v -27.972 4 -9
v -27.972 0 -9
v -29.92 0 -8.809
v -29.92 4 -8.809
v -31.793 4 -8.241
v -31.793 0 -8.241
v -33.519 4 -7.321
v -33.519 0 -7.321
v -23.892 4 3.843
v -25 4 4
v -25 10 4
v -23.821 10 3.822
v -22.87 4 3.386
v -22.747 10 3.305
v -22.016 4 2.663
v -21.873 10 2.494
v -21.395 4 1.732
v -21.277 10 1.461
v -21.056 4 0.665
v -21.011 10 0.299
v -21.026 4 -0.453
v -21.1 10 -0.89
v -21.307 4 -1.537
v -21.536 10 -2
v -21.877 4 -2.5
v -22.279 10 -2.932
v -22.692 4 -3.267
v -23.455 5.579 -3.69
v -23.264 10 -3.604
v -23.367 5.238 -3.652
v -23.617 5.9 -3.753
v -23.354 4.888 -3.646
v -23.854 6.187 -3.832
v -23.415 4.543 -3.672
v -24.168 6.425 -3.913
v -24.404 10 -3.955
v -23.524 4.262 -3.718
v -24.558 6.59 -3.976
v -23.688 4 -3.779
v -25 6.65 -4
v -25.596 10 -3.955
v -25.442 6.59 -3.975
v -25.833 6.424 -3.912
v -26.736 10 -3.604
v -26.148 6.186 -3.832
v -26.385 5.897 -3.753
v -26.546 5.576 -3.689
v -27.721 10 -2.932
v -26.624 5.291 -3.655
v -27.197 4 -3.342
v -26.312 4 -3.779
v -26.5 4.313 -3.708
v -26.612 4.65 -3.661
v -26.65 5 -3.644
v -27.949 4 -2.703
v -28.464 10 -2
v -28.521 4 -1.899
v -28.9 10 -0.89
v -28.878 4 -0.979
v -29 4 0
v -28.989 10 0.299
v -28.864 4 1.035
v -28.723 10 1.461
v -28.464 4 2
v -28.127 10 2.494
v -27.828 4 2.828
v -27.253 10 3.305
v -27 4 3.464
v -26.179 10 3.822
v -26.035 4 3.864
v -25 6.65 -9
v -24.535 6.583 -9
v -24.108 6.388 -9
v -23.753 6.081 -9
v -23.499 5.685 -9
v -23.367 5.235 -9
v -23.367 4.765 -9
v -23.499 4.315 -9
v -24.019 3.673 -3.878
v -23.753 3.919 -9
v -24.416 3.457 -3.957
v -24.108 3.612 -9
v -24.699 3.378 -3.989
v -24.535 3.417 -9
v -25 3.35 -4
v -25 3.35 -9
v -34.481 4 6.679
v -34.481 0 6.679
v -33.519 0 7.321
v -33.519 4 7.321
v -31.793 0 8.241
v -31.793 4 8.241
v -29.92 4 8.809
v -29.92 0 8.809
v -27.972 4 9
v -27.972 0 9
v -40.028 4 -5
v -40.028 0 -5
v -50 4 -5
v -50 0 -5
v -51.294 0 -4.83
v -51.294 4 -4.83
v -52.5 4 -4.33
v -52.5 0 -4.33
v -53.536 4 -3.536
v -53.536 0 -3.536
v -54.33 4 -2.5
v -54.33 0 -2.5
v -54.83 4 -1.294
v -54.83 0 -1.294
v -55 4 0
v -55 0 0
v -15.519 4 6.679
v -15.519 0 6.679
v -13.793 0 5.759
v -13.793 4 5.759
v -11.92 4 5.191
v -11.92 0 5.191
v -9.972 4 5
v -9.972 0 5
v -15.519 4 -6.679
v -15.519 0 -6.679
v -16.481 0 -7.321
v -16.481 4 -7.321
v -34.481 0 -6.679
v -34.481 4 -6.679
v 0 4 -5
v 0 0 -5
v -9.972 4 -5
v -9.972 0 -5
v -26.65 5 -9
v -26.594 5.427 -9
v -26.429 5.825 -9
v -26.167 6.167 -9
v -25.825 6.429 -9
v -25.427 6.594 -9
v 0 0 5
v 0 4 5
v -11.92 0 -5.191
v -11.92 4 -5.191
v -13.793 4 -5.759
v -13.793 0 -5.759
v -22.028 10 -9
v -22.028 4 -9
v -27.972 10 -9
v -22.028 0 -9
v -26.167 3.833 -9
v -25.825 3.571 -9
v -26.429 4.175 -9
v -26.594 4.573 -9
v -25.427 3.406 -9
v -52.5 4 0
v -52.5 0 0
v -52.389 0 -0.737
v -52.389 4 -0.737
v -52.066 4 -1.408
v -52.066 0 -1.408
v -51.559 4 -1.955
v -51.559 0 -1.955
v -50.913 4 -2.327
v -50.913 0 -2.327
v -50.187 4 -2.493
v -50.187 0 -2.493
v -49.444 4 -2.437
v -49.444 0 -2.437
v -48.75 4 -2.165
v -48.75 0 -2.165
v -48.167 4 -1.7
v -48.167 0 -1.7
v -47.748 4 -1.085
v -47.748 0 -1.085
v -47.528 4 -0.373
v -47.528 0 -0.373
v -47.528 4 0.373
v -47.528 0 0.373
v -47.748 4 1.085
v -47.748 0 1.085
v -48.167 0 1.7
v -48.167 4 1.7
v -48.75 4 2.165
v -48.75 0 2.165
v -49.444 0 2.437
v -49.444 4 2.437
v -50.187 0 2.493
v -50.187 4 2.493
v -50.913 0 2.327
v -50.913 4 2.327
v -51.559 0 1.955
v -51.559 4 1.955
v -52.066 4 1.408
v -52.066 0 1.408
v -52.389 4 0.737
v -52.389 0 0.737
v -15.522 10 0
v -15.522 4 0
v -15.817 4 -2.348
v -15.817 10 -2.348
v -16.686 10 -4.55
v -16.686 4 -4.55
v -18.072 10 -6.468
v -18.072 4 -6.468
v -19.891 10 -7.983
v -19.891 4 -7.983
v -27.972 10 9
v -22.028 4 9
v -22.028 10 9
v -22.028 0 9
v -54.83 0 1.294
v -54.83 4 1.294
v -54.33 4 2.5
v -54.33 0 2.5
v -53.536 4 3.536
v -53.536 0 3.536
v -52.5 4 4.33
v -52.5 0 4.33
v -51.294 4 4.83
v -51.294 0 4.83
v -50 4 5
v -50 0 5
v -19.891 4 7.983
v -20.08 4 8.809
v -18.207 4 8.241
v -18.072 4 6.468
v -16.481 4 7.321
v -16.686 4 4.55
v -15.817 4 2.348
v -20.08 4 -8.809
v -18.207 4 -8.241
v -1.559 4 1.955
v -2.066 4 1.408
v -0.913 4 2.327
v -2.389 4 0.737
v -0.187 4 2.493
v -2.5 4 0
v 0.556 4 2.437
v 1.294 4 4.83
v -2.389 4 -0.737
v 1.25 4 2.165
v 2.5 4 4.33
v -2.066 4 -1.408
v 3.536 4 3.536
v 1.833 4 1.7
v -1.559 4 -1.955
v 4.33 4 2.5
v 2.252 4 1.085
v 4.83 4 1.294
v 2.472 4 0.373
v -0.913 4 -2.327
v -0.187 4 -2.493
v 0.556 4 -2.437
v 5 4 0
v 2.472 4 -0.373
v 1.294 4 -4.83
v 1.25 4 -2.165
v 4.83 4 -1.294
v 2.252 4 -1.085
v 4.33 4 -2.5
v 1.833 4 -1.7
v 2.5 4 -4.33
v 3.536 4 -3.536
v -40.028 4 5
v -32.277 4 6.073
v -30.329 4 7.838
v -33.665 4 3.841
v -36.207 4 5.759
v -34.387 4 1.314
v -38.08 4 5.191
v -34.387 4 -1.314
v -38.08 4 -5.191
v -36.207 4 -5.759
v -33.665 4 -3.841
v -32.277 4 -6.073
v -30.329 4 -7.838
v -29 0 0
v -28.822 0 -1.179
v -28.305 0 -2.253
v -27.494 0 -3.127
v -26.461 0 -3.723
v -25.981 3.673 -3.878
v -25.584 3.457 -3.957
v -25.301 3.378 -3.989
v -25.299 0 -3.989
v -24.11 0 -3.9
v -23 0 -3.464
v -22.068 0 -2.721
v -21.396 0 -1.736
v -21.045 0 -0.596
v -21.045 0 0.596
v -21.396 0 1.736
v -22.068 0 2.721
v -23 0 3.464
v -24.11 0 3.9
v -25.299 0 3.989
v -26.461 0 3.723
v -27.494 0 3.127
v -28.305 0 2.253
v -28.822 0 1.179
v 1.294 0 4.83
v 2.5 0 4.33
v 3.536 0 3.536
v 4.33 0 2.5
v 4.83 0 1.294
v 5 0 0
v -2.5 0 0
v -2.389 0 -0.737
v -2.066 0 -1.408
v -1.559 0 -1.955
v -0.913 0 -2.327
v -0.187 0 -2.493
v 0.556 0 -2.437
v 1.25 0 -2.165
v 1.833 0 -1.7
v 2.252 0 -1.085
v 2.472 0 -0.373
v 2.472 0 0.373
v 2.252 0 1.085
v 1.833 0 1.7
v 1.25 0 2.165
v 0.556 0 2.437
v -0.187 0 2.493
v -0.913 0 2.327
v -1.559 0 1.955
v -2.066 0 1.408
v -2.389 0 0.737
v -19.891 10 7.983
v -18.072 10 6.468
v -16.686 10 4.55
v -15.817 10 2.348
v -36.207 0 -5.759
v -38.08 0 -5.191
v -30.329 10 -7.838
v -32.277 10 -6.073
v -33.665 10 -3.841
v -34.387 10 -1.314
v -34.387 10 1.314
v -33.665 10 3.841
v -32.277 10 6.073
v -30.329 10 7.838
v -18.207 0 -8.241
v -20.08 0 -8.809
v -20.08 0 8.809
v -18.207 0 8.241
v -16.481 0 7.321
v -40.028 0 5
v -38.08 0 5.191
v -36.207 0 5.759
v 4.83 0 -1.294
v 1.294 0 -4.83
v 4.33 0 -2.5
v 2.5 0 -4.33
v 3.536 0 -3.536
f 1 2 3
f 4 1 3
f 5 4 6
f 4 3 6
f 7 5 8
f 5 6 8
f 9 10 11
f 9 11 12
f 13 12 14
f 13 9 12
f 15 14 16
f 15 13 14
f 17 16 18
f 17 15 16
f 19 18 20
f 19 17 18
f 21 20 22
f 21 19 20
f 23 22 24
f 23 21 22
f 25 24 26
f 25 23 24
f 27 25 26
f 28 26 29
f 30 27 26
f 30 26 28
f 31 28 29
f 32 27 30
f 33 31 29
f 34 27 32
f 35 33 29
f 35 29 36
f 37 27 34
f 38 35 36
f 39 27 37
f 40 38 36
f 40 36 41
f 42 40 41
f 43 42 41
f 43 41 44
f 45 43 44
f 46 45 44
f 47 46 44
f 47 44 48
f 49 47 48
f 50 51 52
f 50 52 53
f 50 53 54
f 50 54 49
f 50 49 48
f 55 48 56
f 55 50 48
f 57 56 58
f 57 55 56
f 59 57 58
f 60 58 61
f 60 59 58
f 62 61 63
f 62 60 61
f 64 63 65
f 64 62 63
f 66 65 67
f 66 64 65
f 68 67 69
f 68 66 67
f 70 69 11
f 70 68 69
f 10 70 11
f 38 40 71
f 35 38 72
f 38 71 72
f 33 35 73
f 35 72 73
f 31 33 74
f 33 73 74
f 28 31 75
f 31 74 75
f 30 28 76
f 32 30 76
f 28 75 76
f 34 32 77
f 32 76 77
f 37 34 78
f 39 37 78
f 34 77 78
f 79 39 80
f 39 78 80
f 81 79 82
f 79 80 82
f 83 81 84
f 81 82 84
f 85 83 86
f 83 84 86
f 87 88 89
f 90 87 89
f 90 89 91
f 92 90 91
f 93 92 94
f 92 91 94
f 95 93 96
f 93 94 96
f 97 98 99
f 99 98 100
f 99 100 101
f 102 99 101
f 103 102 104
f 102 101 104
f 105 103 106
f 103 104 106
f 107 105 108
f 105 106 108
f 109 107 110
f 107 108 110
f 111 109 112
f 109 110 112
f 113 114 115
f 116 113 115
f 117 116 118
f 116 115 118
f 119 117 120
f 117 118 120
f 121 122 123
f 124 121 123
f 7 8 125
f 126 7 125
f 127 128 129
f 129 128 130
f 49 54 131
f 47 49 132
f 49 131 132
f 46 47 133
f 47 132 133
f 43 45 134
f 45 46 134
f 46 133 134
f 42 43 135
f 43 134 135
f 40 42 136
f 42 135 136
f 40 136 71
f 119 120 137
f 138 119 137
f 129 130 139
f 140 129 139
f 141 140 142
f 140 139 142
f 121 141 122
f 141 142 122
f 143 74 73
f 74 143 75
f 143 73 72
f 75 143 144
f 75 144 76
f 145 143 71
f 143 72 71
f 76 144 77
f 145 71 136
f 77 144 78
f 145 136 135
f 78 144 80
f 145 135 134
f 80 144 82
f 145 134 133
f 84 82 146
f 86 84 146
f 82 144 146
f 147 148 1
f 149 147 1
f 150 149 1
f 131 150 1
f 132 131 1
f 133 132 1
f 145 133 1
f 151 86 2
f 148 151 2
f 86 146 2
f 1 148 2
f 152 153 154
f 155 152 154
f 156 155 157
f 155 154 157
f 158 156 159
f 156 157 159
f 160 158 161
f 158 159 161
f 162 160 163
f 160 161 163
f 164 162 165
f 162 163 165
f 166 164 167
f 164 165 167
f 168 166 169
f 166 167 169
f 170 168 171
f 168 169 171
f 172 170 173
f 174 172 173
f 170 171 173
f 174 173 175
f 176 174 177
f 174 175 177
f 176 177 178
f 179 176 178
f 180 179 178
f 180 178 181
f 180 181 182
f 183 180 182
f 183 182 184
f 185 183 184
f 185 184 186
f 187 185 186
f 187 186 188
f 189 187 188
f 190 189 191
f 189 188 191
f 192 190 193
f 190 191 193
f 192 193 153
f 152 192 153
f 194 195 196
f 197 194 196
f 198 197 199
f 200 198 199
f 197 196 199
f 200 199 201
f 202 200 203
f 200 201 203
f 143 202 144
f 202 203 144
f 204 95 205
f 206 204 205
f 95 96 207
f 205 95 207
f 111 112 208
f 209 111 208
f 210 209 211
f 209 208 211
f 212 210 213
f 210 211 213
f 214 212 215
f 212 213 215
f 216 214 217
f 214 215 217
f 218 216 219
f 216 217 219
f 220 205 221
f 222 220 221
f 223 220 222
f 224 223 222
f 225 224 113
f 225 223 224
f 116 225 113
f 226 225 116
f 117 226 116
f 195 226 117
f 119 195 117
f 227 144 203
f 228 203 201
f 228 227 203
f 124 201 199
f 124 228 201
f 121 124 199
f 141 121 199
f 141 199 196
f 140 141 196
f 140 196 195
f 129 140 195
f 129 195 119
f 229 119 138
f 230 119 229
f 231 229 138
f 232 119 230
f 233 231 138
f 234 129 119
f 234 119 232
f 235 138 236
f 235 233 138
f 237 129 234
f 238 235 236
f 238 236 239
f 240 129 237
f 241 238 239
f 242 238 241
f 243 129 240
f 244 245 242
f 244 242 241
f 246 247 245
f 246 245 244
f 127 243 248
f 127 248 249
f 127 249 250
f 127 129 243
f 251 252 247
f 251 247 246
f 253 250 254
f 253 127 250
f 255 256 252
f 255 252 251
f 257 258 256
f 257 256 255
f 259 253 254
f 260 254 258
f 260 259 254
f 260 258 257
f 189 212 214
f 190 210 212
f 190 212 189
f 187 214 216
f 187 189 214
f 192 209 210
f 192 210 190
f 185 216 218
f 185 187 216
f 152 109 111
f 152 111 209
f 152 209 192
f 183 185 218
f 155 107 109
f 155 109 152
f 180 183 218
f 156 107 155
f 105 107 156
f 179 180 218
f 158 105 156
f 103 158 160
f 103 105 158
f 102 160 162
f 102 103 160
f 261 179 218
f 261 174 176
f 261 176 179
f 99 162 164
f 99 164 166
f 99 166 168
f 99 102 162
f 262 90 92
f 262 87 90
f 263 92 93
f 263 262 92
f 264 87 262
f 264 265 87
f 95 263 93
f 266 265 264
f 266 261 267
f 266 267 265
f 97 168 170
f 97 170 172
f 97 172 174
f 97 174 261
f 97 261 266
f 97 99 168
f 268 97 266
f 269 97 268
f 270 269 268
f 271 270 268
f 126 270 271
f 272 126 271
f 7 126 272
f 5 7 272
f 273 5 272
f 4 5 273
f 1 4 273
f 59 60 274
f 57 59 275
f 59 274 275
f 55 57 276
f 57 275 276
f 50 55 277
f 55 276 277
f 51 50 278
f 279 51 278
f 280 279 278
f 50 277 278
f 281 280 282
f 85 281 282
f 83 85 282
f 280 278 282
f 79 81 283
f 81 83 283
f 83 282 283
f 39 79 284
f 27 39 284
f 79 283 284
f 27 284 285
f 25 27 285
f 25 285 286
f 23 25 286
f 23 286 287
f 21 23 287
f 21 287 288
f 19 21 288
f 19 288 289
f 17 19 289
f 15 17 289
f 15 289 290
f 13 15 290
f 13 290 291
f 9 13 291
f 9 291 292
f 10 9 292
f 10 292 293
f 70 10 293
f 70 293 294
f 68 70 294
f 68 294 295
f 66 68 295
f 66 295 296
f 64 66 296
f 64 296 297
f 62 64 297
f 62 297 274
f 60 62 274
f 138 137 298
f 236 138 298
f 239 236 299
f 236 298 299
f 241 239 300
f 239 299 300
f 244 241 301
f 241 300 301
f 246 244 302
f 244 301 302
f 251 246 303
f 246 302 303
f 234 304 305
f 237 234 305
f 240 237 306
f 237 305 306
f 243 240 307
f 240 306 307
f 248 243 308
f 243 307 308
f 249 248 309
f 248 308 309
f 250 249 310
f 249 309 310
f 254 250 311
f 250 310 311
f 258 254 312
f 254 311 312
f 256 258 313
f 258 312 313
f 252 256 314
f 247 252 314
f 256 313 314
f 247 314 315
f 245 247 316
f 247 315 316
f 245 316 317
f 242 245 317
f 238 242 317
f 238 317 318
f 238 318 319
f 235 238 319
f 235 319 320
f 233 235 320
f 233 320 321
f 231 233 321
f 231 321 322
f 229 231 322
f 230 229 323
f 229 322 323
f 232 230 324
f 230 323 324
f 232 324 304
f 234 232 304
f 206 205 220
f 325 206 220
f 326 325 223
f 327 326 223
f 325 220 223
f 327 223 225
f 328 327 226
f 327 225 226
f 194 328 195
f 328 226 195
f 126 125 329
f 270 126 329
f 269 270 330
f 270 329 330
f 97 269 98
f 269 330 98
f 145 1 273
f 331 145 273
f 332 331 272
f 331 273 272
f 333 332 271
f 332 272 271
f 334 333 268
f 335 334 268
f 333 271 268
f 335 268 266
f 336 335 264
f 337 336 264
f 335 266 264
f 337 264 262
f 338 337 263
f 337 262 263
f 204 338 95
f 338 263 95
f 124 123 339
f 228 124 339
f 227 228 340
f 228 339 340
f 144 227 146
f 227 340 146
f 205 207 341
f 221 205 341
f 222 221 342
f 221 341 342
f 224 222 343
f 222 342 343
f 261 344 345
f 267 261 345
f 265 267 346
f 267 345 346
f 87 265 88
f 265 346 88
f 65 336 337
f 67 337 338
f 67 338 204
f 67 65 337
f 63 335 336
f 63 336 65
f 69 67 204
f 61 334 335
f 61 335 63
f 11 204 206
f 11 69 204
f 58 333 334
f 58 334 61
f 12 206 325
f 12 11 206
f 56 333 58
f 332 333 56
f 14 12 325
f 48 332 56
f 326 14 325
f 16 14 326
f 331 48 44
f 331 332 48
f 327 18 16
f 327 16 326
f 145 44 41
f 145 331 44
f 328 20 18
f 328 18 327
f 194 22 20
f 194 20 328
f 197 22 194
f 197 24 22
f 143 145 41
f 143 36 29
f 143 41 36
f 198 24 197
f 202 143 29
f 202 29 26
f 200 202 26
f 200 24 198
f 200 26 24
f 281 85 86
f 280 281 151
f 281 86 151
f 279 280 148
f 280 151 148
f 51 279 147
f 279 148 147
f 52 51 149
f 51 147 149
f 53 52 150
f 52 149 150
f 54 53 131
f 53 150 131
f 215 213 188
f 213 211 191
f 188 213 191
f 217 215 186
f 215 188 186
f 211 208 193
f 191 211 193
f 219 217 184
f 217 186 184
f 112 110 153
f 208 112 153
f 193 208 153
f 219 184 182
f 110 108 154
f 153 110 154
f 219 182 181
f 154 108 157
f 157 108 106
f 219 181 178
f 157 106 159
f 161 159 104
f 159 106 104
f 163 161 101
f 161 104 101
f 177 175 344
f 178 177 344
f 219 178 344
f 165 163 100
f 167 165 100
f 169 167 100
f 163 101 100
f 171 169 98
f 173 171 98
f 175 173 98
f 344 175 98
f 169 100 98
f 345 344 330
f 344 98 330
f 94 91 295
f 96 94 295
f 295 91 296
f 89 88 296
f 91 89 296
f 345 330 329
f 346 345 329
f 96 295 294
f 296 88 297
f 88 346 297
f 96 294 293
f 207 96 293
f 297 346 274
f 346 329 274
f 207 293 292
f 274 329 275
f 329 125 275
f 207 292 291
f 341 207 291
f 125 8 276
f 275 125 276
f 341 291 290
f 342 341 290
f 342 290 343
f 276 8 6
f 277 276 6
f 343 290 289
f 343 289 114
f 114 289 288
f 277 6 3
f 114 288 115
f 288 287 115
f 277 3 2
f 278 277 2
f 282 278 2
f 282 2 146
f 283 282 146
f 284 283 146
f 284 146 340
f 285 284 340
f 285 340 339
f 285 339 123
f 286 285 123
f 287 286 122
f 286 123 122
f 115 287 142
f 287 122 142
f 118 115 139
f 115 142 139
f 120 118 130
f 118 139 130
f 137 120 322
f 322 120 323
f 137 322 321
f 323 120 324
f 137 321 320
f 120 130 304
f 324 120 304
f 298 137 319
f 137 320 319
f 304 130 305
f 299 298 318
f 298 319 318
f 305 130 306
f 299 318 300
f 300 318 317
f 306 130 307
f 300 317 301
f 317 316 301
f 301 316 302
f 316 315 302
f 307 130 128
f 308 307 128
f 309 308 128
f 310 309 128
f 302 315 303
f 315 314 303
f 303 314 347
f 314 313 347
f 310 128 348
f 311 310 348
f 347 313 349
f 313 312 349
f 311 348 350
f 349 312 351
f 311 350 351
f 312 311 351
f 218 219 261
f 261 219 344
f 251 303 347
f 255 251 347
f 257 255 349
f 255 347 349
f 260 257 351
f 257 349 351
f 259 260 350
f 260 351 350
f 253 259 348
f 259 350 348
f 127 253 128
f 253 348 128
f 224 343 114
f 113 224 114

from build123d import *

# Parameters (mm, degrees)
BOSS_EXTRUDE1_DEPTH = 4
SKETCH4_R           = 4
BOSS_EXTRUDE3_DEPTH = 6
CUT_EXTRUDE1_DEPTH  = 6


with BuildPart() as part:
    # Sketch1 → Boss-Extrude1 (new body)
    with BuildSketch(Plane(origin=(0, 0, 0), x_dir=(1, 0, 0), z_dir=(0, 1, 0))):
        with BuildLine():
            Line((-9.972243623, -5), (0, -5))
            ThreePointArc((0, -5), (3.535533906, -3.535533906), (5, 0))
            Line((5, 0), (2.5, 0))
            ThreePointArc((2.5, 0), (0, -2.5), (-2.5, 0))
            Line((-2.5, 0), (-21, 0))
            ThreePointArc((-21, 0), (-25, -4), (-29, 0))
            Line((-29, 0), (-47.5, 0))
            ThreePointArc((-47.5, 0), (-50, -2.5), (-52.5, 0))
            Line((-52.5, 0), (-55, 0))
            ThreePointArc((-55, 0), (-53.535533906, -3.535533906), (-50, -5))
            Line((-50, -5), (-40.027756377, -5))
            Line((-40.027756377, -5), (-9.972243623, -5))
        make_face()
        with BuildLine():
            Line((2.5, 0), (5, 0))
            ThreePointArc((5, 0), (3.535533906, 3.535533906), (0, 5))
            Line((0, 5), (-9.972243623, 5))
            Line((-9.972243623, 5), (-25, 5))
            Line((-25, 5), (-40.027756377, 5))
            Line((-40.027756377, 5), (-50, 5))
            ThreePointArc((-50, 5), (-53.535533906, 3.535533906), (-55, 0))
            Line((-55, 0), (-52.5, 0))
            ThreePointArc((-52.5, 0), (-50, 2.5), (-47.5, 0))
            Line((-47.5, 0), (-29, 0))
            ThreePointArc((-29, 0), (-25, 4), (-21, 0))
            Line((-21, 0), (-2.5, 0))
            ThreePointArc((-2.5, 0), (0, 2.5), (2.5, 0))
        make_face()
        with BuildLine():
            ThreePointArc((-15.519245585, -6.679497057), (-12.87008511, -5.429079735), (-9.972243623, -5))
            Line((-9.972243623, -5), (-40.027756377, -5))
            ThreePointArc((-40.027756377, -5), (-37.12991489, -5.429079735), (-34.480754415, -6.679497057))
            Line((-34.480754415, -6.679497057), (-33.519245585, -7.320502943))
            ThreePointArc((-33.519245585, -7.320502943), (-30.87008511, -8.570920265), (-27.972243623, -9))
            Line((-27.972243623, -9), (-22.027756377, -9))
            ThreePointArc((-22.027756377, -9), (-19.12991489, -8.570920265), (-16.480754415, -7.320502943))
            Line((-16.480754415, -7.320502943), (-15.519245585, -6.679497057))
        make_face()
        with BuildLine():
            Line((-25, 5), (-9.972243623, 5))
            ThreePointArc((-9.972243623, 5), (-12.87008511, 5.429079735), (-15.519245585, 6.679497057))
            Line((-15.519245585, 6.679497057), (-16.480754415, 7.320502943))
            ThreePointArc((-16.480754415, 7.320502943), (-19.12991489, 8.570920265), (-22.027756377, 9))
            Line((-22.027756377, 9), (-25, 9))
            Line((-25, 9), (-25, 5))
        make_face()
        with BuildLine():
            Line((-40.027756377, 5), (-25, 5))
            Line((-25, 5), (-25, 9))
            Line((-25, 9), (-27.972243623, 9))
            ThreePointArc((-27.972243623, 9), (-30.87008511, 8.570920265), (-33.519245585, 7.320502943))
            Line((-33.519245585, 7.320502943), (-34.480754415, 6.679497057))
            ThreePointArc((-34.480754415, 6.679497057), (-37.12991489, 5.429079735), (-40.027756377, 5))
        make_face()
    extrude(amount=BOSS_EXTRUDE1_DEPTH)

    # Sketch4 → Boss-Extrude3 (add)
    with BuildSketch(Plane(origin=(0, 4, 0), x_dir=(1, 0, 0), z_dir=(0, 1, 0))):
        with BuildLine():
            ThreePointArc((-15.521907779, 0), (-17.31867748, 5.552613483), (-22.027756377, 9))
            Line((-22.027756377, 9), (-27.972243623, 9))
            ThreePointArc((-27.972243623, 9), (-34.478092221, 0), (-27.972243623, -9))
            Line((-27.972243623, -9), (-22.027756377, -9))
            ThreePointArc((-22.027756377, -9), (-17.31867748, -5.552613483), (-15.521907779, 0))
        make_face()
        with Locations(Location((-25, 0, 0), (0, 0, 270))):
            Circle(SKETCH4_R, mode=Mode.SUBTRACT)
    extrude(amount=BOSS_EXTRUDE3_DEPTH)

    # Sketch5 → Cut-Extrude1 (cut)
    with BuildSketch(Plane(origin=(0, 0, -9), x_dir=(-1, 0, 0), z_dir=(0, 0, -1))):
        with BuildLine():
            ThreePointArc((26.65, 5), (26.166726189, 6.166726189), (25, 6.65))
            Line((25, 6.65), (25, 3.35))
            ThreePointArc((25, 3.35), (26.166726189, 3.833273811), (26.65, 5))
        make_face()
        with BuildLine():
            Line((25, 3.35), (25, 6.65))
            ThreePointArc((25, 6.65), (23.35, 5), (25, 3.35))
        make_face()
    extrude(amount=-CUT_EXTRUDE1_DEPTH, mode=Mode.SUBTRACT)


solid = part.part
